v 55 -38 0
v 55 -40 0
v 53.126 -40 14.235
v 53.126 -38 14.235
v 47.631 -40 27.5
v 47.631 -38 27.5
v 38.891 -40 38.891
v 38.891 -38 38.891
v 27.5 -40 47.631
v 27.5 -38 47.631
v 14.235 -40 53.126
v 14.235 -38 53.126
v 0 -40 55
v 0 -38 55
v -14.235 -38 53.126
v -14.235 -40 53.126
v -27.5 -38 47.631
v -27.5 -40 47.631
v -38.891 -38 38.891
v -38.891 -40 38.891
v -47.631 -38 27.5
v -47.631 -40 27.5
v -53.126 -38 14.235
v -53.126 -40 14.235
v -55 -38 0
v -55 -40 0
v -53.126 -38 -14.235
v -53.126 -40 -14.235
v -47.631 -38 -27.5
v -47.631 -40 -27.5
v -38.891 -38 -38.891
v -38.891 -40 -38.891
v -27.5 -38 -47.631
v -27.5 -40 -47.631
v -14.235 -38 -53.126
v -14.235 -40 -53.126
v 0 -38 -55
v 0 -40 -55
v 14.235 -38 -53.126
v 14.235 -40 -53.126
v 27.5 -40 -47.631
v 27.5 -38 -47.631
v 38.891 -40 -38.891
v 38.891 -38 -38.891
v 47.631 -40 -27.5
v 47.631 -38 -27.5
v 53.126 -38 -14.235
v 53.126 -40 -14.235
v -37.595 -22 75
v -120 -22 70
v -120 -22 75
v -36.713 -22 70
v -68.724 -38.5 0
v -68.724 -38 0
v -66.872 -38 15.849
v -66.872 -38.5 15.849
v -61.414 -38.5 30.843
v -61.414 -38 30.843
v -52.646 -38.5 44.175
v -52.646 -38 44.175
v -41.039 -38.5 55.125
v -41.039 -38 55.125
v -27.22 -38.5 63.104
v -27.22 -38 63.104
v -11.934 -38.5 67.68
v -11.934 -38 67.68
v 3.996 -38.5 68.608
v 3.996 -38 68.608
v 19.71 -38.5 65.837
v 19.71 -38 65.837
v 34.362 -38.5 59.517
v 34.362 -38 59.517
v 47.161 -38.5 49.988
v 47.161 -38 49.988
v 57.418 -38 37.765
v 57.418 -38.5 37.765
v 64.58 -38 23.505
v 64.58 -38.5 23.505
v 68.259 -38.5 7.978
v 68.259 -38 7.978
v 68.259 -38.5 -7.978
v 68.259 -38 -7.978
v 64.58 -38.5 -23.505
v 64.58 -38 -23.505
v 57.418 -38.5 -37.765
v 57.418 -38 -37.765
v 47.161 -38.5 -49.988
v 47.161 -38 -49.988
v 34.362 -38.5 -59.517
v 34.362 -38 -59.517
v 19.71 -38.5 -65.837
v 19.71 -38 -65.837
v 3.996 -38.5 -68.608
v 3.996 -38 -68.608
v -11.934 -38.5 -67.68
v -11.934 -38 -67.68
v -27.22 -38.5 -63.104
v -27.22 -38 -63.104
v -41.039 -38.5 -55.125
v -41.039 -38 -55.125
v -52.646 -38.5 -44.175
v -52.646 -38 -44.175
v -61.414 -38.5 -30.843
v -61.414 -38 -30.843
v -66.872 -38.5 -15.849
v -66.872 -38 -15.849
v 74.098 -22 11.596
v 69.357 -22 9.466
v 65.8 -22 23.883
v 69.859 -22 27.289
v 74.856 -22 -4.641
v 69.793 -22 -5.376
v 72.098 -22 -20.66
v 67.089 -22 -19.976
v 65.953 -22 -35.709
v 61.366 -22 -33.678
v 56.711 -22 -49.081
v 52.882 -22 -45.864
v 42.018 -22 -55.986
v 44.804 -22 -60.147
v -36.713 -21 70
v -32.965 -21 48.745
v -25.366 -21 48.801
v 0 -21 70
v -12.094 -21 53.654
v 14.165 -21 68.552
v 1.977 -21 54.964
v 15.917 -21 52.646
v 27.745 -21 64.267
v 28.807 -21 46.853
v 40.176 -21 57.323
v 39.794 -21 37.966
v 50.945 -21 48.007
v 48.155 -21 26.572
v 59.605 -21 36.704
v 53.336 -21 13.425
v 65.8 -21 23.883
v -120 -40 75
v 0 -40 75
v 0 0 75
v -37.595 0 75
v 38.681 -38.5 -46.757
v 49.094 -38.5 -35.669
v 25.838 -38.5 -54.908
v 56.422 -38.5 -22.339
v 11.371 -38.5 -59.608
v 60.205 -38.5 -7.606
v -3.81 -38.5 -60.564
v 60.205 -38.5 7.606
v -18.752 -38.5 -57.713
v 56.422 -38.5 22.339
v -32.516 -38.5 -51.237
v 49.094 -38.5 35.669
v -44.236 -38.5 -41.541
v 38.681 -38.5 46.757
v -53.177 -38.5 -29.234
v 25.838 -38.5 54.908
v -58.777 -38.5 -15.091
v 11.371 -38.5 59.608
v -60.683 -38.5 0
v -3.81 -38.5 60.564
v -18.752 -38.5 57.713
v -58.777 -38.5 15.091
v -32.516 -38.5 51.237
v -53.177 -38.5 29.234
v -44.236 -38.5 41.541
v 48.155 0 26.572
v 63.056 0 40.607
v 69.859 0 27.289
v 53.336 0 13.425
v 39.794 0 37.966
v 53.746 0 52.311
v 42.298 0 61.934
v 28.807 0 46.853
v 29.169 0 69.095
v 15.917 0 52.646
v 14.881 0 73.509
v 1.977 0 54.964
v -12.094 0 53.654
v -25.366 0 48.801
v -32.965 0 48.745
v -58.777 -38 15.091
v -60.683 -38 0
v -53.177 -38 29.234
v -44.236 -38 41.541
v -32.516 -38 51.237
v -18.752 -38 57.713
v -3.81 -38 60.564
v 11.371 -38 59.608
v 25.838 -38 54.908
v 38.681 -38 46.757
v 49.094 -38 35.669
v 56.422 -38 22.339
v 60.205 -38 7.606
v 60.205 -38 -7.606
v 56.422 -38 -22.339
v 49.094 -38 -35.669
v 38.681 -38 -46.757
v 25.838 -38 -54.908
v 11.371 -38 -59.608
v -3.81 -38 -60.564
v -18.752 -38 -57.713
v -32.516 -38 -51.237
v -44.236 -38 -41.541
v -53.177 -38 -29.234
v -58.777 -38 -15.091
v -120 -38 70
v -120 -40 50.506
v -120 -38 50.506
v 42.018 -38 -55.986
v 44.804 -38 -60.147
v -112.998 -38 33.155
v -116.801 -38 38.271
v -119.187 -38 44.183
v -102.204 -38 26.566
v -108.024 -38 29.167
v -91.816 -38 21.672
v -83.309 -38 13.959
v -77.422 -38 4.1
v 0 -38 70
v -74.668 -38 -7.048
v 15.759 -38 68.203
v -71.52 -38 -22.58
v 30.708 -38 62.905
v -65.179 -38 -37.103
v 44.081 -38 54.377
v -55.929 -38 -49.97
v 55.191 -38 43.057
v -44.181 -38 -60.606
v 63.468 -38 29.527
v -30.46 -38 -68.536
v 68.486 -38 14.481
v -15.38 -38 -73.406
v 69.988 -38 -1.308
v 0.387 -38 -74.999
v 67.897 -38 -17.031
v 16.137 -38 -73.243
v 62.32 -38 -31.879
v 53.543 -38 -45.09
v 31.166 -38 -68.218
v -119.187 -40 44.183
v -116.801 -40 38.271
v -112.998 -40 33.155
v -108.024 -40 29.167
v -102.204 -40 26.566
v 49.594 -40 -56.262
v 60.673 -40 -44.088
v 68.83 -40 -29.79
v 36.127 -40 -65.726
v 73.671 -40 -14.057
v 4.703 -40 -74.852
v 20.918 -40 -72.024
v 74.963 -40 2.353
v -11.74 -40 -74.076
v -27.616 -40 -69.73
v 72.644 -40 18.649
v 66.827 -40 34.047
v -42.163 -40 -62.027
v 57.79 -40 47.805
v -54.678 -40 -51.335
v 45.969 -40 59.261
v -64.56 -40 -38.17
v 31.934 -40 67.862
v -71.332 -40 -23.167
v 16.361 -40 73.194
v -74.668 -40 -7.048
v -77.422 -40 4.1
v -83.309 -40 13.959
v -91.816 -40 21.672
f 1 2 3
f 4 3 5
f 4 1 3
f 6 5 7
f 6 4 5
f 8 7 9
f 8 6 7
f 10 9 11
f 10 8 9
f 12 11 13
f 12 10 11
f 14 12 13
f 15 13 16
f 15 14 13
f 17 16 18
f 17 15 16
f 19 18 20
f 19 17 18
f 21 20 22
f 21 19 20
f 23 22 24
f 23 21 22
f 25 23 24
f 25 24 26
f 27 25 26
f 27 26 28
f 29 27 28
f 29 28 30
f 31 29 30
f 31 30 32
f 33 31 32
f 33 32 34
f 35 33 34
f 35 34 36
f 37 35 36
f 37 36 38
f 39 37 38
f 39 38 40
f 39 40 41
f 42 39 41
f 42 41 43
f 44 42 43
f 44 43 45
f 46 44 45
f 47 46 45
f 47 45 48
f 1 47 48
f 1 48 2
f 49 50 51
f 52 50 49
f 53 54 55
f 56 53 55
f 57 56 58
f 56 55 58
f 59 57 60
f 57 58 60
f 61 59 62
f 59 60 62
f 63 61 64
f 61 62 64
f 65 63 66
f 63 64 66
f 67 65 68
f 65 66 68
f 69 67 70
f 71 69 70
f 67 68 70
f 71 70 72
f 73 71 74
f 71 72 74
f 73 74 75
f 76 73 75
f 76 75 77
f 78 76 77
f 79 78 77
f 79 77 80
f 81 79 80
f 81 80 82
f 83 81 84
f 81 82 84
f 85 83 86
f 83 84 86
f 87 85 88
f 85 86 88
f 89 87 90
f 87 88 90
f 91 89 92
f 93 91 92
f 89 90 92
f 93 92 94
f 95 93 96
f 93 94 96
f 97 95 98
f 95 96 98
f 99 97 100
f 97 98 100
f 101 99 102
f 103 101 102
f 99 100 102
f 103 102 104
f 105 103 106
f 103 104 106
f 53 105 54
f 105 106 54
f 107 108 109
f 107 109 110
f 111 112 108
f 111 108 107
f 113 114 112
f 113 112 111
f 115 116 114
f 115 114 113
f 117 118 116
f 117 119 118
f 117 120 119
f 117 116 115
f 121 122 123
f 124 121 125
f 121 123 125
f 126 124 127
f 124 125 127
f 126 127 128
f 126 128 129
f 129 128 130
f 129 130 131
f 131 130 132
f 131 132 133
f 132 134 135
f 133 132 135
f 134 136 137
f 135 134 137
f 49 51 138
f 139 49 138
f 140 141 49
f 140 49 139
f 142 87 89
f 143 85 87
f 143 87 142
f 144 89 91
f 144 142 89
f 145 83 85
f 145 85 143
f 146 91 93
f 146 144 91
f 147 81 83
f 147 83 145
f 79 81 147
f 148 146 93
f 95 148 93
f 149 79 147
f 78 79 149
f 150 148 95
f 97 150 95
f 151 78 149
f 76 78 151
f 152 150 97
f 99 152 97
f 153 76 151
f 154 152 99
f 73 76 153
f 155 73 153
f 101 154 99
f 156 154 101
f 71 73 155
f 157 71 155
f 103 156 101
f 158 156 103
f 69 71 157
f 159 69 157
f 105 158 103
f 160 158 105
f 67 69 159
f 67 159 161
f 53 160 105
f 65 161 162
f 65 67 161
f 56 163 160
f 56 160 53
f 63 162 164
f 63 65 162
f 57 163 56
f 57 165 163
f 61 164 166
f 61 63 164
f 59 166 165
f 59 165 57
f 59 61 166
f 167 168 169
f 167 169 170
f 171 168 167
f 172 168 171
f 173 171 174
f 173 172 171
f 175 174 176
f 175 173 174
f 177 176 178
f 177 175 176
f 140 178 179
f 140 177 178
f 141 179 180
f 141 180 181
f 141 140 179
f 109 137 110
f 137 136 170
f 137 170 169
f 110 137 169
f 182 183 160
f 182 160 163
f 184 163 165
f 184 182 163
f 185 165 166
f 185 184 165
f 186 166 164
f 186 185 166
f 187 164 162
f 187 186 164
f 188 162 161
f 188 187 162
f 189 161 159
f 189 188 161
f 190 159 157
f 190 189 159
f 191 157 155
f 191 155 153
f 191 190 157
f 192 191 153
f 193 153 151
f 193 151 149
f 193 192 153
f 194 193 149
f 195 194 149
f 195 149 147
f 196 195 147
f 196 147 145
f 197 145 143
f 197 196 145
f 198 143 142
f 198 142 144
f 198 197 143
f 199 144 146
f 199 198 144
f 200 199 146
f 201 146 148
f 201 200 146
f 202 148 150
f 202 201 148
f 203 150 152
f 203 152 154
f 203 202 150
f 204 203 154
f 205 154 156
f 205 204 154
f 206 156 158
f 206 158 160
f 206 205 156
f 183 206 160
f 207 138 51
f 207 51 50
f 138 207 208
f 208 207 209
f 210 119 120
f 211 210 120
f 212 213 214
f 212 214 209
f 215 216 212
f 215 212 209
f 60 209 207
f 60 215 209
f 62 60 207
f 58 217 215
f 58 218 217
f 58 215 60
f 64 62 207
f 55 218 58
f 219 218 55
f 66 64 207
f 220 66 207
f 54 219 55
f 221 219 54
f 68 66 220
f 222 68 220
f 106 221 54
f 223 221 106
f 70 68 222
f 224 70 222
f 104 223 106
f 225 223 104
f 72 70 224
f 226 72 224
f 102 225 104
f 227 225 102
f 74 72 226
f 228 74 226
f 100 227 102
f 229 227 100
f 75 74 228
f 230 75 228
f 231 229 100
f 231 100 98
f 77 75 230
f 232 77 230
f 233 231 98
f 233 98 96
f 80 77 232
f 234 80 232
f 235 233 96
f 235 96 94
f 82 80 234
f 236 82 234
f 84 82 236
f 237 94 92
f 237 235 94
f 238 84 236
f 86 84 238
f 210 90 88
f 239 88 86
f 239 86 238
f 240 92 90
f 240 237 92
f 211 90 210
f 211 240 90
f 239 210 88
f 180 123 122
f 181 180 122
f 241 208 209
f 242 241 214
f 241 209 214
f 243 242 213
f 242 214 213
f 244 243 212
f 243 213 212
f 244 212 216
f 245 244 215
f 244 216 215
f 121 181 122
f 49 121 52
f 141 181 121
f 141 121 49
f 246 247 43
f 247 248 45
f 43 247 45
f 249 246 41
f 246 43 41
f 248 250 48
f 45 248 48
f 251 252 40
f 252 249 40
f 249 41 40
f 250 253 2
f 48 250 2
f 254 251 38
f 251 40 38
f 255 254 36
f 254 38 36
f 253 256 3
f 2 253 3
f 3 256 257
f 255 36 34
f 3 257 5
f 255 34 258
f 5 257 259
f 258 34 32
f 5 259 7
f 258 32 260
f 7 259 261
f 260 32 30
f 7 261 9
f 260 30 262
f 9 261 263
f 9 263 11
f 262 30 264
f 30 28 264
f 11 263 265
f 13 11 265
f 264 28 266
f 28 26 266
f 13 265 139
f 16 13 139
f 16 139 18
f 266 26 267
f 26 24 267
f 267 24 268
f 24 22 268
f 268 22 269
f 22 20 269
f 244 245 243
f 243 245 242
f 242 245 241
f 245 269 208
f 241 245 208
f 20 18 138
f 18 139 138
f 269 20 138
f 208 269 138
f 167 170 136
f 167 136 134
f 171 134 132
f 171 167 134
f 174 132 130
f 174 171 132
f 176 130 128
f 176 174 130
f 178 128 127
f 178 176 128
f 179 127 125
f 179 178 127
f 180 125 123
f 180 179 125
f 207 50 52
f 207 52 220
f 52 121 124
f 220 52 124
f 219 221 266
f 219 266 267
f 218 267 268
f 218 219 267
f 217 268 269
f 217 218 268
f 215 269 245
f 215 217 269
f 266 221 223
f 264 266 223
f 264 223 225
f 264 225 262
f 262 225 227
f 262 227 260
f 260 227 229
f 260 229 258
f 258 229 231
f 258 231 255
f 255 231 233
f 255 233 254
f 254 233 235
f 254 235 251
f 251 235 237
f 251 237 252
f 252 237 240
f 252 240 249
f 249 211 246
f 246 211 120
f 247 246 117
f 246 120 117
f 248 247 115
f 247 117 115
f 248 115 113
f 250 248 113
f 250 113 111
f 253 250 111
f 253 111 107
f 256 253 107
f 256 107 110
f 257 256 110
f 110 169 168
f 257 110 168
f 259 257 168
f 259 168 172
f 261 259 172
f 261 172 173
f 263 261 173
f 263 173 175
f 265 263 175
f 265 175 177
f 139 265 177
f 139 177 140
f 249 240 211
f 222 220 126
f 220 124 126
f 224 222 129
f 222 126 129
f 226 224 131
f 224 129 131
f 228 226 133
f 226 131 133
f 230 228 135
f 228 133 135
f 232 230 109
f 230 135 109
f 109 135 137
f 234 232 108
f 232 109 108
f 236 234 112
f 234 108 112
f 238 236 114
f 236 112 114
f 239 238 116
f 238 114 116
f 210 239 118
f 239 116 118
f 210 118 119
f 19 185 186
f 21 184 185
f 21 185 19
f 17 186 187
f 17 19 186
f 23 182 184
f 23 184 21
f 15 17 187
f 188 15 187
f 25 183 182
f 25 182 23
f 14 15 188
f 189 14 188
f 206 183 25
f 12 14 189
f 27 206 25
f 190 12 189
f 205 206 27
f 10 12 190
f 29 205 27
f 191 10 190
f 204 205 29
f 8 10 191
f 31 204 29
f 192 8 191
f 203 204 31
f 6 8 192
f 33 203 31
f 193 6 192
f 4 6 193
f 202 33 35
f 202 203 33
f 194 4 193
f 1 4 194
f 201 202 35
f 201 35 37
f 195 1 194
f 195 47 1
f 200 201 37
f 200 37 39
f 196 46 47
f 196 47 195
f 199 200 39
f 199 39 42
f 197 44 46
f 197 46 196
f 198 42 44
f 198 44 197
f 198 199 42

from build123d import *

# Parameters (mm, degrees)
SKETCH_R             = 55
PAD_DEPTH            = 40
POCKET_DEPTH         = 22
POCKET001_DEPTH      = 16
POCKET001_DEPTH_BACK = 1
SKETCH004_R          = 68.724133
SKETCH004_R_2        = 60.683335
POCKET002_DEPTH      = 0.5


with BuildPart() as part:
    # Sketch → Pad (new body)
    with BuildSketch(Plane.XZ):
        with BuildLine():
            Line((-120, 75), (0, 75))
            ThreePointArc((-74.66808, -7.048245), (55.468993, -50.479608), (0, 75))
            ThreePointArc((-74.66808, -7.048245), (-83.30852, 13.959176), (-102.203647, 26.566441))
            ThreePointArc((-120, 50.506104), (-115.063539, 35.591198), (-102.203647, 26.566441))
            Line((-120, 75), (-120, 50.506104))
        make_face()
        Circle(SKETCH_R, mode=Mode.SUBTRACT)
    extrude(amount=PAD_DEPTH)

    # Sketch001 (on Face7 of Pad) → Pocket (cut)
    with BuildSketch(Plane(origin=(0, 0, 0), x_dir=(1, 0, 0), z_dir=(0, 1, 0))):
        with BuildLine():
            Line((52.0812, -12.37154), (85.552437, -40.457244))
            ThreePointArc((85.552437, -40.457244), (20.73224, 92.337329), (-94.636188, 0))
            Line((-211.758942, -108.831918), (-94.636188, 0))
            Line((-43.560242, -108.831918), (-211.758942, -108.831918))
            Line((-32.965385, -48.745498), (-43.560242, -108.831918))
            Line((21.227394, -49.141674), (-32.965385, -48.745498))
            Line((52.0812, -12.37154), (21.227394, -49.141674))
        make_face()
    extrude(amount=-POCKET_DEPTH, mode=Mode.SUBTRACT)

    # Sketch003 (on Face2 of Pocket) → Pocket001 (cut, two sides)
    with BuildSketch(Plane(origin=(0, -22, 0), x_dir=(1, 0, 0), z_dir=(0, 1, 0))) as pocket001_sk:
        with BuildLine():
            ThreePointArc((0, -70), (66.404243, -22.146705), (42.018147, 55.986385))
            Line((42.018147, 55.986385), (62.226624, 86.16832))
            Line((62.226624, 86.16832), (-170.809082, 86.16832))
            Line((-170.809082, 86.16832), (-170.809082, -70))
            Line((-170.809082, -70), (0, -70))
        make_face()
    extrude(amount=-POCKET001_DEPTH, mode=Mode.SUBTRACT)
    extrude(pocket001_sk.sketch, amount=POCKET001_DEPTH_BACK, mode=Mode.SUBTRACT)

    # Sketch004 → Pocket002 (cut)
    with BuildSketch(Plane(origin=(0, -38, 0), x_dir=(-1, 0, 0), z_dir=(0, 1, 0))):
        Circle(SKETCH004_R)
        Circle(SKETCH004_R_2, mode=Mode.SUBTRACT)
    extrude(amount=-POCKET002_DEPTH, mode=Mode.SUBTRACT)


solid = part.part
